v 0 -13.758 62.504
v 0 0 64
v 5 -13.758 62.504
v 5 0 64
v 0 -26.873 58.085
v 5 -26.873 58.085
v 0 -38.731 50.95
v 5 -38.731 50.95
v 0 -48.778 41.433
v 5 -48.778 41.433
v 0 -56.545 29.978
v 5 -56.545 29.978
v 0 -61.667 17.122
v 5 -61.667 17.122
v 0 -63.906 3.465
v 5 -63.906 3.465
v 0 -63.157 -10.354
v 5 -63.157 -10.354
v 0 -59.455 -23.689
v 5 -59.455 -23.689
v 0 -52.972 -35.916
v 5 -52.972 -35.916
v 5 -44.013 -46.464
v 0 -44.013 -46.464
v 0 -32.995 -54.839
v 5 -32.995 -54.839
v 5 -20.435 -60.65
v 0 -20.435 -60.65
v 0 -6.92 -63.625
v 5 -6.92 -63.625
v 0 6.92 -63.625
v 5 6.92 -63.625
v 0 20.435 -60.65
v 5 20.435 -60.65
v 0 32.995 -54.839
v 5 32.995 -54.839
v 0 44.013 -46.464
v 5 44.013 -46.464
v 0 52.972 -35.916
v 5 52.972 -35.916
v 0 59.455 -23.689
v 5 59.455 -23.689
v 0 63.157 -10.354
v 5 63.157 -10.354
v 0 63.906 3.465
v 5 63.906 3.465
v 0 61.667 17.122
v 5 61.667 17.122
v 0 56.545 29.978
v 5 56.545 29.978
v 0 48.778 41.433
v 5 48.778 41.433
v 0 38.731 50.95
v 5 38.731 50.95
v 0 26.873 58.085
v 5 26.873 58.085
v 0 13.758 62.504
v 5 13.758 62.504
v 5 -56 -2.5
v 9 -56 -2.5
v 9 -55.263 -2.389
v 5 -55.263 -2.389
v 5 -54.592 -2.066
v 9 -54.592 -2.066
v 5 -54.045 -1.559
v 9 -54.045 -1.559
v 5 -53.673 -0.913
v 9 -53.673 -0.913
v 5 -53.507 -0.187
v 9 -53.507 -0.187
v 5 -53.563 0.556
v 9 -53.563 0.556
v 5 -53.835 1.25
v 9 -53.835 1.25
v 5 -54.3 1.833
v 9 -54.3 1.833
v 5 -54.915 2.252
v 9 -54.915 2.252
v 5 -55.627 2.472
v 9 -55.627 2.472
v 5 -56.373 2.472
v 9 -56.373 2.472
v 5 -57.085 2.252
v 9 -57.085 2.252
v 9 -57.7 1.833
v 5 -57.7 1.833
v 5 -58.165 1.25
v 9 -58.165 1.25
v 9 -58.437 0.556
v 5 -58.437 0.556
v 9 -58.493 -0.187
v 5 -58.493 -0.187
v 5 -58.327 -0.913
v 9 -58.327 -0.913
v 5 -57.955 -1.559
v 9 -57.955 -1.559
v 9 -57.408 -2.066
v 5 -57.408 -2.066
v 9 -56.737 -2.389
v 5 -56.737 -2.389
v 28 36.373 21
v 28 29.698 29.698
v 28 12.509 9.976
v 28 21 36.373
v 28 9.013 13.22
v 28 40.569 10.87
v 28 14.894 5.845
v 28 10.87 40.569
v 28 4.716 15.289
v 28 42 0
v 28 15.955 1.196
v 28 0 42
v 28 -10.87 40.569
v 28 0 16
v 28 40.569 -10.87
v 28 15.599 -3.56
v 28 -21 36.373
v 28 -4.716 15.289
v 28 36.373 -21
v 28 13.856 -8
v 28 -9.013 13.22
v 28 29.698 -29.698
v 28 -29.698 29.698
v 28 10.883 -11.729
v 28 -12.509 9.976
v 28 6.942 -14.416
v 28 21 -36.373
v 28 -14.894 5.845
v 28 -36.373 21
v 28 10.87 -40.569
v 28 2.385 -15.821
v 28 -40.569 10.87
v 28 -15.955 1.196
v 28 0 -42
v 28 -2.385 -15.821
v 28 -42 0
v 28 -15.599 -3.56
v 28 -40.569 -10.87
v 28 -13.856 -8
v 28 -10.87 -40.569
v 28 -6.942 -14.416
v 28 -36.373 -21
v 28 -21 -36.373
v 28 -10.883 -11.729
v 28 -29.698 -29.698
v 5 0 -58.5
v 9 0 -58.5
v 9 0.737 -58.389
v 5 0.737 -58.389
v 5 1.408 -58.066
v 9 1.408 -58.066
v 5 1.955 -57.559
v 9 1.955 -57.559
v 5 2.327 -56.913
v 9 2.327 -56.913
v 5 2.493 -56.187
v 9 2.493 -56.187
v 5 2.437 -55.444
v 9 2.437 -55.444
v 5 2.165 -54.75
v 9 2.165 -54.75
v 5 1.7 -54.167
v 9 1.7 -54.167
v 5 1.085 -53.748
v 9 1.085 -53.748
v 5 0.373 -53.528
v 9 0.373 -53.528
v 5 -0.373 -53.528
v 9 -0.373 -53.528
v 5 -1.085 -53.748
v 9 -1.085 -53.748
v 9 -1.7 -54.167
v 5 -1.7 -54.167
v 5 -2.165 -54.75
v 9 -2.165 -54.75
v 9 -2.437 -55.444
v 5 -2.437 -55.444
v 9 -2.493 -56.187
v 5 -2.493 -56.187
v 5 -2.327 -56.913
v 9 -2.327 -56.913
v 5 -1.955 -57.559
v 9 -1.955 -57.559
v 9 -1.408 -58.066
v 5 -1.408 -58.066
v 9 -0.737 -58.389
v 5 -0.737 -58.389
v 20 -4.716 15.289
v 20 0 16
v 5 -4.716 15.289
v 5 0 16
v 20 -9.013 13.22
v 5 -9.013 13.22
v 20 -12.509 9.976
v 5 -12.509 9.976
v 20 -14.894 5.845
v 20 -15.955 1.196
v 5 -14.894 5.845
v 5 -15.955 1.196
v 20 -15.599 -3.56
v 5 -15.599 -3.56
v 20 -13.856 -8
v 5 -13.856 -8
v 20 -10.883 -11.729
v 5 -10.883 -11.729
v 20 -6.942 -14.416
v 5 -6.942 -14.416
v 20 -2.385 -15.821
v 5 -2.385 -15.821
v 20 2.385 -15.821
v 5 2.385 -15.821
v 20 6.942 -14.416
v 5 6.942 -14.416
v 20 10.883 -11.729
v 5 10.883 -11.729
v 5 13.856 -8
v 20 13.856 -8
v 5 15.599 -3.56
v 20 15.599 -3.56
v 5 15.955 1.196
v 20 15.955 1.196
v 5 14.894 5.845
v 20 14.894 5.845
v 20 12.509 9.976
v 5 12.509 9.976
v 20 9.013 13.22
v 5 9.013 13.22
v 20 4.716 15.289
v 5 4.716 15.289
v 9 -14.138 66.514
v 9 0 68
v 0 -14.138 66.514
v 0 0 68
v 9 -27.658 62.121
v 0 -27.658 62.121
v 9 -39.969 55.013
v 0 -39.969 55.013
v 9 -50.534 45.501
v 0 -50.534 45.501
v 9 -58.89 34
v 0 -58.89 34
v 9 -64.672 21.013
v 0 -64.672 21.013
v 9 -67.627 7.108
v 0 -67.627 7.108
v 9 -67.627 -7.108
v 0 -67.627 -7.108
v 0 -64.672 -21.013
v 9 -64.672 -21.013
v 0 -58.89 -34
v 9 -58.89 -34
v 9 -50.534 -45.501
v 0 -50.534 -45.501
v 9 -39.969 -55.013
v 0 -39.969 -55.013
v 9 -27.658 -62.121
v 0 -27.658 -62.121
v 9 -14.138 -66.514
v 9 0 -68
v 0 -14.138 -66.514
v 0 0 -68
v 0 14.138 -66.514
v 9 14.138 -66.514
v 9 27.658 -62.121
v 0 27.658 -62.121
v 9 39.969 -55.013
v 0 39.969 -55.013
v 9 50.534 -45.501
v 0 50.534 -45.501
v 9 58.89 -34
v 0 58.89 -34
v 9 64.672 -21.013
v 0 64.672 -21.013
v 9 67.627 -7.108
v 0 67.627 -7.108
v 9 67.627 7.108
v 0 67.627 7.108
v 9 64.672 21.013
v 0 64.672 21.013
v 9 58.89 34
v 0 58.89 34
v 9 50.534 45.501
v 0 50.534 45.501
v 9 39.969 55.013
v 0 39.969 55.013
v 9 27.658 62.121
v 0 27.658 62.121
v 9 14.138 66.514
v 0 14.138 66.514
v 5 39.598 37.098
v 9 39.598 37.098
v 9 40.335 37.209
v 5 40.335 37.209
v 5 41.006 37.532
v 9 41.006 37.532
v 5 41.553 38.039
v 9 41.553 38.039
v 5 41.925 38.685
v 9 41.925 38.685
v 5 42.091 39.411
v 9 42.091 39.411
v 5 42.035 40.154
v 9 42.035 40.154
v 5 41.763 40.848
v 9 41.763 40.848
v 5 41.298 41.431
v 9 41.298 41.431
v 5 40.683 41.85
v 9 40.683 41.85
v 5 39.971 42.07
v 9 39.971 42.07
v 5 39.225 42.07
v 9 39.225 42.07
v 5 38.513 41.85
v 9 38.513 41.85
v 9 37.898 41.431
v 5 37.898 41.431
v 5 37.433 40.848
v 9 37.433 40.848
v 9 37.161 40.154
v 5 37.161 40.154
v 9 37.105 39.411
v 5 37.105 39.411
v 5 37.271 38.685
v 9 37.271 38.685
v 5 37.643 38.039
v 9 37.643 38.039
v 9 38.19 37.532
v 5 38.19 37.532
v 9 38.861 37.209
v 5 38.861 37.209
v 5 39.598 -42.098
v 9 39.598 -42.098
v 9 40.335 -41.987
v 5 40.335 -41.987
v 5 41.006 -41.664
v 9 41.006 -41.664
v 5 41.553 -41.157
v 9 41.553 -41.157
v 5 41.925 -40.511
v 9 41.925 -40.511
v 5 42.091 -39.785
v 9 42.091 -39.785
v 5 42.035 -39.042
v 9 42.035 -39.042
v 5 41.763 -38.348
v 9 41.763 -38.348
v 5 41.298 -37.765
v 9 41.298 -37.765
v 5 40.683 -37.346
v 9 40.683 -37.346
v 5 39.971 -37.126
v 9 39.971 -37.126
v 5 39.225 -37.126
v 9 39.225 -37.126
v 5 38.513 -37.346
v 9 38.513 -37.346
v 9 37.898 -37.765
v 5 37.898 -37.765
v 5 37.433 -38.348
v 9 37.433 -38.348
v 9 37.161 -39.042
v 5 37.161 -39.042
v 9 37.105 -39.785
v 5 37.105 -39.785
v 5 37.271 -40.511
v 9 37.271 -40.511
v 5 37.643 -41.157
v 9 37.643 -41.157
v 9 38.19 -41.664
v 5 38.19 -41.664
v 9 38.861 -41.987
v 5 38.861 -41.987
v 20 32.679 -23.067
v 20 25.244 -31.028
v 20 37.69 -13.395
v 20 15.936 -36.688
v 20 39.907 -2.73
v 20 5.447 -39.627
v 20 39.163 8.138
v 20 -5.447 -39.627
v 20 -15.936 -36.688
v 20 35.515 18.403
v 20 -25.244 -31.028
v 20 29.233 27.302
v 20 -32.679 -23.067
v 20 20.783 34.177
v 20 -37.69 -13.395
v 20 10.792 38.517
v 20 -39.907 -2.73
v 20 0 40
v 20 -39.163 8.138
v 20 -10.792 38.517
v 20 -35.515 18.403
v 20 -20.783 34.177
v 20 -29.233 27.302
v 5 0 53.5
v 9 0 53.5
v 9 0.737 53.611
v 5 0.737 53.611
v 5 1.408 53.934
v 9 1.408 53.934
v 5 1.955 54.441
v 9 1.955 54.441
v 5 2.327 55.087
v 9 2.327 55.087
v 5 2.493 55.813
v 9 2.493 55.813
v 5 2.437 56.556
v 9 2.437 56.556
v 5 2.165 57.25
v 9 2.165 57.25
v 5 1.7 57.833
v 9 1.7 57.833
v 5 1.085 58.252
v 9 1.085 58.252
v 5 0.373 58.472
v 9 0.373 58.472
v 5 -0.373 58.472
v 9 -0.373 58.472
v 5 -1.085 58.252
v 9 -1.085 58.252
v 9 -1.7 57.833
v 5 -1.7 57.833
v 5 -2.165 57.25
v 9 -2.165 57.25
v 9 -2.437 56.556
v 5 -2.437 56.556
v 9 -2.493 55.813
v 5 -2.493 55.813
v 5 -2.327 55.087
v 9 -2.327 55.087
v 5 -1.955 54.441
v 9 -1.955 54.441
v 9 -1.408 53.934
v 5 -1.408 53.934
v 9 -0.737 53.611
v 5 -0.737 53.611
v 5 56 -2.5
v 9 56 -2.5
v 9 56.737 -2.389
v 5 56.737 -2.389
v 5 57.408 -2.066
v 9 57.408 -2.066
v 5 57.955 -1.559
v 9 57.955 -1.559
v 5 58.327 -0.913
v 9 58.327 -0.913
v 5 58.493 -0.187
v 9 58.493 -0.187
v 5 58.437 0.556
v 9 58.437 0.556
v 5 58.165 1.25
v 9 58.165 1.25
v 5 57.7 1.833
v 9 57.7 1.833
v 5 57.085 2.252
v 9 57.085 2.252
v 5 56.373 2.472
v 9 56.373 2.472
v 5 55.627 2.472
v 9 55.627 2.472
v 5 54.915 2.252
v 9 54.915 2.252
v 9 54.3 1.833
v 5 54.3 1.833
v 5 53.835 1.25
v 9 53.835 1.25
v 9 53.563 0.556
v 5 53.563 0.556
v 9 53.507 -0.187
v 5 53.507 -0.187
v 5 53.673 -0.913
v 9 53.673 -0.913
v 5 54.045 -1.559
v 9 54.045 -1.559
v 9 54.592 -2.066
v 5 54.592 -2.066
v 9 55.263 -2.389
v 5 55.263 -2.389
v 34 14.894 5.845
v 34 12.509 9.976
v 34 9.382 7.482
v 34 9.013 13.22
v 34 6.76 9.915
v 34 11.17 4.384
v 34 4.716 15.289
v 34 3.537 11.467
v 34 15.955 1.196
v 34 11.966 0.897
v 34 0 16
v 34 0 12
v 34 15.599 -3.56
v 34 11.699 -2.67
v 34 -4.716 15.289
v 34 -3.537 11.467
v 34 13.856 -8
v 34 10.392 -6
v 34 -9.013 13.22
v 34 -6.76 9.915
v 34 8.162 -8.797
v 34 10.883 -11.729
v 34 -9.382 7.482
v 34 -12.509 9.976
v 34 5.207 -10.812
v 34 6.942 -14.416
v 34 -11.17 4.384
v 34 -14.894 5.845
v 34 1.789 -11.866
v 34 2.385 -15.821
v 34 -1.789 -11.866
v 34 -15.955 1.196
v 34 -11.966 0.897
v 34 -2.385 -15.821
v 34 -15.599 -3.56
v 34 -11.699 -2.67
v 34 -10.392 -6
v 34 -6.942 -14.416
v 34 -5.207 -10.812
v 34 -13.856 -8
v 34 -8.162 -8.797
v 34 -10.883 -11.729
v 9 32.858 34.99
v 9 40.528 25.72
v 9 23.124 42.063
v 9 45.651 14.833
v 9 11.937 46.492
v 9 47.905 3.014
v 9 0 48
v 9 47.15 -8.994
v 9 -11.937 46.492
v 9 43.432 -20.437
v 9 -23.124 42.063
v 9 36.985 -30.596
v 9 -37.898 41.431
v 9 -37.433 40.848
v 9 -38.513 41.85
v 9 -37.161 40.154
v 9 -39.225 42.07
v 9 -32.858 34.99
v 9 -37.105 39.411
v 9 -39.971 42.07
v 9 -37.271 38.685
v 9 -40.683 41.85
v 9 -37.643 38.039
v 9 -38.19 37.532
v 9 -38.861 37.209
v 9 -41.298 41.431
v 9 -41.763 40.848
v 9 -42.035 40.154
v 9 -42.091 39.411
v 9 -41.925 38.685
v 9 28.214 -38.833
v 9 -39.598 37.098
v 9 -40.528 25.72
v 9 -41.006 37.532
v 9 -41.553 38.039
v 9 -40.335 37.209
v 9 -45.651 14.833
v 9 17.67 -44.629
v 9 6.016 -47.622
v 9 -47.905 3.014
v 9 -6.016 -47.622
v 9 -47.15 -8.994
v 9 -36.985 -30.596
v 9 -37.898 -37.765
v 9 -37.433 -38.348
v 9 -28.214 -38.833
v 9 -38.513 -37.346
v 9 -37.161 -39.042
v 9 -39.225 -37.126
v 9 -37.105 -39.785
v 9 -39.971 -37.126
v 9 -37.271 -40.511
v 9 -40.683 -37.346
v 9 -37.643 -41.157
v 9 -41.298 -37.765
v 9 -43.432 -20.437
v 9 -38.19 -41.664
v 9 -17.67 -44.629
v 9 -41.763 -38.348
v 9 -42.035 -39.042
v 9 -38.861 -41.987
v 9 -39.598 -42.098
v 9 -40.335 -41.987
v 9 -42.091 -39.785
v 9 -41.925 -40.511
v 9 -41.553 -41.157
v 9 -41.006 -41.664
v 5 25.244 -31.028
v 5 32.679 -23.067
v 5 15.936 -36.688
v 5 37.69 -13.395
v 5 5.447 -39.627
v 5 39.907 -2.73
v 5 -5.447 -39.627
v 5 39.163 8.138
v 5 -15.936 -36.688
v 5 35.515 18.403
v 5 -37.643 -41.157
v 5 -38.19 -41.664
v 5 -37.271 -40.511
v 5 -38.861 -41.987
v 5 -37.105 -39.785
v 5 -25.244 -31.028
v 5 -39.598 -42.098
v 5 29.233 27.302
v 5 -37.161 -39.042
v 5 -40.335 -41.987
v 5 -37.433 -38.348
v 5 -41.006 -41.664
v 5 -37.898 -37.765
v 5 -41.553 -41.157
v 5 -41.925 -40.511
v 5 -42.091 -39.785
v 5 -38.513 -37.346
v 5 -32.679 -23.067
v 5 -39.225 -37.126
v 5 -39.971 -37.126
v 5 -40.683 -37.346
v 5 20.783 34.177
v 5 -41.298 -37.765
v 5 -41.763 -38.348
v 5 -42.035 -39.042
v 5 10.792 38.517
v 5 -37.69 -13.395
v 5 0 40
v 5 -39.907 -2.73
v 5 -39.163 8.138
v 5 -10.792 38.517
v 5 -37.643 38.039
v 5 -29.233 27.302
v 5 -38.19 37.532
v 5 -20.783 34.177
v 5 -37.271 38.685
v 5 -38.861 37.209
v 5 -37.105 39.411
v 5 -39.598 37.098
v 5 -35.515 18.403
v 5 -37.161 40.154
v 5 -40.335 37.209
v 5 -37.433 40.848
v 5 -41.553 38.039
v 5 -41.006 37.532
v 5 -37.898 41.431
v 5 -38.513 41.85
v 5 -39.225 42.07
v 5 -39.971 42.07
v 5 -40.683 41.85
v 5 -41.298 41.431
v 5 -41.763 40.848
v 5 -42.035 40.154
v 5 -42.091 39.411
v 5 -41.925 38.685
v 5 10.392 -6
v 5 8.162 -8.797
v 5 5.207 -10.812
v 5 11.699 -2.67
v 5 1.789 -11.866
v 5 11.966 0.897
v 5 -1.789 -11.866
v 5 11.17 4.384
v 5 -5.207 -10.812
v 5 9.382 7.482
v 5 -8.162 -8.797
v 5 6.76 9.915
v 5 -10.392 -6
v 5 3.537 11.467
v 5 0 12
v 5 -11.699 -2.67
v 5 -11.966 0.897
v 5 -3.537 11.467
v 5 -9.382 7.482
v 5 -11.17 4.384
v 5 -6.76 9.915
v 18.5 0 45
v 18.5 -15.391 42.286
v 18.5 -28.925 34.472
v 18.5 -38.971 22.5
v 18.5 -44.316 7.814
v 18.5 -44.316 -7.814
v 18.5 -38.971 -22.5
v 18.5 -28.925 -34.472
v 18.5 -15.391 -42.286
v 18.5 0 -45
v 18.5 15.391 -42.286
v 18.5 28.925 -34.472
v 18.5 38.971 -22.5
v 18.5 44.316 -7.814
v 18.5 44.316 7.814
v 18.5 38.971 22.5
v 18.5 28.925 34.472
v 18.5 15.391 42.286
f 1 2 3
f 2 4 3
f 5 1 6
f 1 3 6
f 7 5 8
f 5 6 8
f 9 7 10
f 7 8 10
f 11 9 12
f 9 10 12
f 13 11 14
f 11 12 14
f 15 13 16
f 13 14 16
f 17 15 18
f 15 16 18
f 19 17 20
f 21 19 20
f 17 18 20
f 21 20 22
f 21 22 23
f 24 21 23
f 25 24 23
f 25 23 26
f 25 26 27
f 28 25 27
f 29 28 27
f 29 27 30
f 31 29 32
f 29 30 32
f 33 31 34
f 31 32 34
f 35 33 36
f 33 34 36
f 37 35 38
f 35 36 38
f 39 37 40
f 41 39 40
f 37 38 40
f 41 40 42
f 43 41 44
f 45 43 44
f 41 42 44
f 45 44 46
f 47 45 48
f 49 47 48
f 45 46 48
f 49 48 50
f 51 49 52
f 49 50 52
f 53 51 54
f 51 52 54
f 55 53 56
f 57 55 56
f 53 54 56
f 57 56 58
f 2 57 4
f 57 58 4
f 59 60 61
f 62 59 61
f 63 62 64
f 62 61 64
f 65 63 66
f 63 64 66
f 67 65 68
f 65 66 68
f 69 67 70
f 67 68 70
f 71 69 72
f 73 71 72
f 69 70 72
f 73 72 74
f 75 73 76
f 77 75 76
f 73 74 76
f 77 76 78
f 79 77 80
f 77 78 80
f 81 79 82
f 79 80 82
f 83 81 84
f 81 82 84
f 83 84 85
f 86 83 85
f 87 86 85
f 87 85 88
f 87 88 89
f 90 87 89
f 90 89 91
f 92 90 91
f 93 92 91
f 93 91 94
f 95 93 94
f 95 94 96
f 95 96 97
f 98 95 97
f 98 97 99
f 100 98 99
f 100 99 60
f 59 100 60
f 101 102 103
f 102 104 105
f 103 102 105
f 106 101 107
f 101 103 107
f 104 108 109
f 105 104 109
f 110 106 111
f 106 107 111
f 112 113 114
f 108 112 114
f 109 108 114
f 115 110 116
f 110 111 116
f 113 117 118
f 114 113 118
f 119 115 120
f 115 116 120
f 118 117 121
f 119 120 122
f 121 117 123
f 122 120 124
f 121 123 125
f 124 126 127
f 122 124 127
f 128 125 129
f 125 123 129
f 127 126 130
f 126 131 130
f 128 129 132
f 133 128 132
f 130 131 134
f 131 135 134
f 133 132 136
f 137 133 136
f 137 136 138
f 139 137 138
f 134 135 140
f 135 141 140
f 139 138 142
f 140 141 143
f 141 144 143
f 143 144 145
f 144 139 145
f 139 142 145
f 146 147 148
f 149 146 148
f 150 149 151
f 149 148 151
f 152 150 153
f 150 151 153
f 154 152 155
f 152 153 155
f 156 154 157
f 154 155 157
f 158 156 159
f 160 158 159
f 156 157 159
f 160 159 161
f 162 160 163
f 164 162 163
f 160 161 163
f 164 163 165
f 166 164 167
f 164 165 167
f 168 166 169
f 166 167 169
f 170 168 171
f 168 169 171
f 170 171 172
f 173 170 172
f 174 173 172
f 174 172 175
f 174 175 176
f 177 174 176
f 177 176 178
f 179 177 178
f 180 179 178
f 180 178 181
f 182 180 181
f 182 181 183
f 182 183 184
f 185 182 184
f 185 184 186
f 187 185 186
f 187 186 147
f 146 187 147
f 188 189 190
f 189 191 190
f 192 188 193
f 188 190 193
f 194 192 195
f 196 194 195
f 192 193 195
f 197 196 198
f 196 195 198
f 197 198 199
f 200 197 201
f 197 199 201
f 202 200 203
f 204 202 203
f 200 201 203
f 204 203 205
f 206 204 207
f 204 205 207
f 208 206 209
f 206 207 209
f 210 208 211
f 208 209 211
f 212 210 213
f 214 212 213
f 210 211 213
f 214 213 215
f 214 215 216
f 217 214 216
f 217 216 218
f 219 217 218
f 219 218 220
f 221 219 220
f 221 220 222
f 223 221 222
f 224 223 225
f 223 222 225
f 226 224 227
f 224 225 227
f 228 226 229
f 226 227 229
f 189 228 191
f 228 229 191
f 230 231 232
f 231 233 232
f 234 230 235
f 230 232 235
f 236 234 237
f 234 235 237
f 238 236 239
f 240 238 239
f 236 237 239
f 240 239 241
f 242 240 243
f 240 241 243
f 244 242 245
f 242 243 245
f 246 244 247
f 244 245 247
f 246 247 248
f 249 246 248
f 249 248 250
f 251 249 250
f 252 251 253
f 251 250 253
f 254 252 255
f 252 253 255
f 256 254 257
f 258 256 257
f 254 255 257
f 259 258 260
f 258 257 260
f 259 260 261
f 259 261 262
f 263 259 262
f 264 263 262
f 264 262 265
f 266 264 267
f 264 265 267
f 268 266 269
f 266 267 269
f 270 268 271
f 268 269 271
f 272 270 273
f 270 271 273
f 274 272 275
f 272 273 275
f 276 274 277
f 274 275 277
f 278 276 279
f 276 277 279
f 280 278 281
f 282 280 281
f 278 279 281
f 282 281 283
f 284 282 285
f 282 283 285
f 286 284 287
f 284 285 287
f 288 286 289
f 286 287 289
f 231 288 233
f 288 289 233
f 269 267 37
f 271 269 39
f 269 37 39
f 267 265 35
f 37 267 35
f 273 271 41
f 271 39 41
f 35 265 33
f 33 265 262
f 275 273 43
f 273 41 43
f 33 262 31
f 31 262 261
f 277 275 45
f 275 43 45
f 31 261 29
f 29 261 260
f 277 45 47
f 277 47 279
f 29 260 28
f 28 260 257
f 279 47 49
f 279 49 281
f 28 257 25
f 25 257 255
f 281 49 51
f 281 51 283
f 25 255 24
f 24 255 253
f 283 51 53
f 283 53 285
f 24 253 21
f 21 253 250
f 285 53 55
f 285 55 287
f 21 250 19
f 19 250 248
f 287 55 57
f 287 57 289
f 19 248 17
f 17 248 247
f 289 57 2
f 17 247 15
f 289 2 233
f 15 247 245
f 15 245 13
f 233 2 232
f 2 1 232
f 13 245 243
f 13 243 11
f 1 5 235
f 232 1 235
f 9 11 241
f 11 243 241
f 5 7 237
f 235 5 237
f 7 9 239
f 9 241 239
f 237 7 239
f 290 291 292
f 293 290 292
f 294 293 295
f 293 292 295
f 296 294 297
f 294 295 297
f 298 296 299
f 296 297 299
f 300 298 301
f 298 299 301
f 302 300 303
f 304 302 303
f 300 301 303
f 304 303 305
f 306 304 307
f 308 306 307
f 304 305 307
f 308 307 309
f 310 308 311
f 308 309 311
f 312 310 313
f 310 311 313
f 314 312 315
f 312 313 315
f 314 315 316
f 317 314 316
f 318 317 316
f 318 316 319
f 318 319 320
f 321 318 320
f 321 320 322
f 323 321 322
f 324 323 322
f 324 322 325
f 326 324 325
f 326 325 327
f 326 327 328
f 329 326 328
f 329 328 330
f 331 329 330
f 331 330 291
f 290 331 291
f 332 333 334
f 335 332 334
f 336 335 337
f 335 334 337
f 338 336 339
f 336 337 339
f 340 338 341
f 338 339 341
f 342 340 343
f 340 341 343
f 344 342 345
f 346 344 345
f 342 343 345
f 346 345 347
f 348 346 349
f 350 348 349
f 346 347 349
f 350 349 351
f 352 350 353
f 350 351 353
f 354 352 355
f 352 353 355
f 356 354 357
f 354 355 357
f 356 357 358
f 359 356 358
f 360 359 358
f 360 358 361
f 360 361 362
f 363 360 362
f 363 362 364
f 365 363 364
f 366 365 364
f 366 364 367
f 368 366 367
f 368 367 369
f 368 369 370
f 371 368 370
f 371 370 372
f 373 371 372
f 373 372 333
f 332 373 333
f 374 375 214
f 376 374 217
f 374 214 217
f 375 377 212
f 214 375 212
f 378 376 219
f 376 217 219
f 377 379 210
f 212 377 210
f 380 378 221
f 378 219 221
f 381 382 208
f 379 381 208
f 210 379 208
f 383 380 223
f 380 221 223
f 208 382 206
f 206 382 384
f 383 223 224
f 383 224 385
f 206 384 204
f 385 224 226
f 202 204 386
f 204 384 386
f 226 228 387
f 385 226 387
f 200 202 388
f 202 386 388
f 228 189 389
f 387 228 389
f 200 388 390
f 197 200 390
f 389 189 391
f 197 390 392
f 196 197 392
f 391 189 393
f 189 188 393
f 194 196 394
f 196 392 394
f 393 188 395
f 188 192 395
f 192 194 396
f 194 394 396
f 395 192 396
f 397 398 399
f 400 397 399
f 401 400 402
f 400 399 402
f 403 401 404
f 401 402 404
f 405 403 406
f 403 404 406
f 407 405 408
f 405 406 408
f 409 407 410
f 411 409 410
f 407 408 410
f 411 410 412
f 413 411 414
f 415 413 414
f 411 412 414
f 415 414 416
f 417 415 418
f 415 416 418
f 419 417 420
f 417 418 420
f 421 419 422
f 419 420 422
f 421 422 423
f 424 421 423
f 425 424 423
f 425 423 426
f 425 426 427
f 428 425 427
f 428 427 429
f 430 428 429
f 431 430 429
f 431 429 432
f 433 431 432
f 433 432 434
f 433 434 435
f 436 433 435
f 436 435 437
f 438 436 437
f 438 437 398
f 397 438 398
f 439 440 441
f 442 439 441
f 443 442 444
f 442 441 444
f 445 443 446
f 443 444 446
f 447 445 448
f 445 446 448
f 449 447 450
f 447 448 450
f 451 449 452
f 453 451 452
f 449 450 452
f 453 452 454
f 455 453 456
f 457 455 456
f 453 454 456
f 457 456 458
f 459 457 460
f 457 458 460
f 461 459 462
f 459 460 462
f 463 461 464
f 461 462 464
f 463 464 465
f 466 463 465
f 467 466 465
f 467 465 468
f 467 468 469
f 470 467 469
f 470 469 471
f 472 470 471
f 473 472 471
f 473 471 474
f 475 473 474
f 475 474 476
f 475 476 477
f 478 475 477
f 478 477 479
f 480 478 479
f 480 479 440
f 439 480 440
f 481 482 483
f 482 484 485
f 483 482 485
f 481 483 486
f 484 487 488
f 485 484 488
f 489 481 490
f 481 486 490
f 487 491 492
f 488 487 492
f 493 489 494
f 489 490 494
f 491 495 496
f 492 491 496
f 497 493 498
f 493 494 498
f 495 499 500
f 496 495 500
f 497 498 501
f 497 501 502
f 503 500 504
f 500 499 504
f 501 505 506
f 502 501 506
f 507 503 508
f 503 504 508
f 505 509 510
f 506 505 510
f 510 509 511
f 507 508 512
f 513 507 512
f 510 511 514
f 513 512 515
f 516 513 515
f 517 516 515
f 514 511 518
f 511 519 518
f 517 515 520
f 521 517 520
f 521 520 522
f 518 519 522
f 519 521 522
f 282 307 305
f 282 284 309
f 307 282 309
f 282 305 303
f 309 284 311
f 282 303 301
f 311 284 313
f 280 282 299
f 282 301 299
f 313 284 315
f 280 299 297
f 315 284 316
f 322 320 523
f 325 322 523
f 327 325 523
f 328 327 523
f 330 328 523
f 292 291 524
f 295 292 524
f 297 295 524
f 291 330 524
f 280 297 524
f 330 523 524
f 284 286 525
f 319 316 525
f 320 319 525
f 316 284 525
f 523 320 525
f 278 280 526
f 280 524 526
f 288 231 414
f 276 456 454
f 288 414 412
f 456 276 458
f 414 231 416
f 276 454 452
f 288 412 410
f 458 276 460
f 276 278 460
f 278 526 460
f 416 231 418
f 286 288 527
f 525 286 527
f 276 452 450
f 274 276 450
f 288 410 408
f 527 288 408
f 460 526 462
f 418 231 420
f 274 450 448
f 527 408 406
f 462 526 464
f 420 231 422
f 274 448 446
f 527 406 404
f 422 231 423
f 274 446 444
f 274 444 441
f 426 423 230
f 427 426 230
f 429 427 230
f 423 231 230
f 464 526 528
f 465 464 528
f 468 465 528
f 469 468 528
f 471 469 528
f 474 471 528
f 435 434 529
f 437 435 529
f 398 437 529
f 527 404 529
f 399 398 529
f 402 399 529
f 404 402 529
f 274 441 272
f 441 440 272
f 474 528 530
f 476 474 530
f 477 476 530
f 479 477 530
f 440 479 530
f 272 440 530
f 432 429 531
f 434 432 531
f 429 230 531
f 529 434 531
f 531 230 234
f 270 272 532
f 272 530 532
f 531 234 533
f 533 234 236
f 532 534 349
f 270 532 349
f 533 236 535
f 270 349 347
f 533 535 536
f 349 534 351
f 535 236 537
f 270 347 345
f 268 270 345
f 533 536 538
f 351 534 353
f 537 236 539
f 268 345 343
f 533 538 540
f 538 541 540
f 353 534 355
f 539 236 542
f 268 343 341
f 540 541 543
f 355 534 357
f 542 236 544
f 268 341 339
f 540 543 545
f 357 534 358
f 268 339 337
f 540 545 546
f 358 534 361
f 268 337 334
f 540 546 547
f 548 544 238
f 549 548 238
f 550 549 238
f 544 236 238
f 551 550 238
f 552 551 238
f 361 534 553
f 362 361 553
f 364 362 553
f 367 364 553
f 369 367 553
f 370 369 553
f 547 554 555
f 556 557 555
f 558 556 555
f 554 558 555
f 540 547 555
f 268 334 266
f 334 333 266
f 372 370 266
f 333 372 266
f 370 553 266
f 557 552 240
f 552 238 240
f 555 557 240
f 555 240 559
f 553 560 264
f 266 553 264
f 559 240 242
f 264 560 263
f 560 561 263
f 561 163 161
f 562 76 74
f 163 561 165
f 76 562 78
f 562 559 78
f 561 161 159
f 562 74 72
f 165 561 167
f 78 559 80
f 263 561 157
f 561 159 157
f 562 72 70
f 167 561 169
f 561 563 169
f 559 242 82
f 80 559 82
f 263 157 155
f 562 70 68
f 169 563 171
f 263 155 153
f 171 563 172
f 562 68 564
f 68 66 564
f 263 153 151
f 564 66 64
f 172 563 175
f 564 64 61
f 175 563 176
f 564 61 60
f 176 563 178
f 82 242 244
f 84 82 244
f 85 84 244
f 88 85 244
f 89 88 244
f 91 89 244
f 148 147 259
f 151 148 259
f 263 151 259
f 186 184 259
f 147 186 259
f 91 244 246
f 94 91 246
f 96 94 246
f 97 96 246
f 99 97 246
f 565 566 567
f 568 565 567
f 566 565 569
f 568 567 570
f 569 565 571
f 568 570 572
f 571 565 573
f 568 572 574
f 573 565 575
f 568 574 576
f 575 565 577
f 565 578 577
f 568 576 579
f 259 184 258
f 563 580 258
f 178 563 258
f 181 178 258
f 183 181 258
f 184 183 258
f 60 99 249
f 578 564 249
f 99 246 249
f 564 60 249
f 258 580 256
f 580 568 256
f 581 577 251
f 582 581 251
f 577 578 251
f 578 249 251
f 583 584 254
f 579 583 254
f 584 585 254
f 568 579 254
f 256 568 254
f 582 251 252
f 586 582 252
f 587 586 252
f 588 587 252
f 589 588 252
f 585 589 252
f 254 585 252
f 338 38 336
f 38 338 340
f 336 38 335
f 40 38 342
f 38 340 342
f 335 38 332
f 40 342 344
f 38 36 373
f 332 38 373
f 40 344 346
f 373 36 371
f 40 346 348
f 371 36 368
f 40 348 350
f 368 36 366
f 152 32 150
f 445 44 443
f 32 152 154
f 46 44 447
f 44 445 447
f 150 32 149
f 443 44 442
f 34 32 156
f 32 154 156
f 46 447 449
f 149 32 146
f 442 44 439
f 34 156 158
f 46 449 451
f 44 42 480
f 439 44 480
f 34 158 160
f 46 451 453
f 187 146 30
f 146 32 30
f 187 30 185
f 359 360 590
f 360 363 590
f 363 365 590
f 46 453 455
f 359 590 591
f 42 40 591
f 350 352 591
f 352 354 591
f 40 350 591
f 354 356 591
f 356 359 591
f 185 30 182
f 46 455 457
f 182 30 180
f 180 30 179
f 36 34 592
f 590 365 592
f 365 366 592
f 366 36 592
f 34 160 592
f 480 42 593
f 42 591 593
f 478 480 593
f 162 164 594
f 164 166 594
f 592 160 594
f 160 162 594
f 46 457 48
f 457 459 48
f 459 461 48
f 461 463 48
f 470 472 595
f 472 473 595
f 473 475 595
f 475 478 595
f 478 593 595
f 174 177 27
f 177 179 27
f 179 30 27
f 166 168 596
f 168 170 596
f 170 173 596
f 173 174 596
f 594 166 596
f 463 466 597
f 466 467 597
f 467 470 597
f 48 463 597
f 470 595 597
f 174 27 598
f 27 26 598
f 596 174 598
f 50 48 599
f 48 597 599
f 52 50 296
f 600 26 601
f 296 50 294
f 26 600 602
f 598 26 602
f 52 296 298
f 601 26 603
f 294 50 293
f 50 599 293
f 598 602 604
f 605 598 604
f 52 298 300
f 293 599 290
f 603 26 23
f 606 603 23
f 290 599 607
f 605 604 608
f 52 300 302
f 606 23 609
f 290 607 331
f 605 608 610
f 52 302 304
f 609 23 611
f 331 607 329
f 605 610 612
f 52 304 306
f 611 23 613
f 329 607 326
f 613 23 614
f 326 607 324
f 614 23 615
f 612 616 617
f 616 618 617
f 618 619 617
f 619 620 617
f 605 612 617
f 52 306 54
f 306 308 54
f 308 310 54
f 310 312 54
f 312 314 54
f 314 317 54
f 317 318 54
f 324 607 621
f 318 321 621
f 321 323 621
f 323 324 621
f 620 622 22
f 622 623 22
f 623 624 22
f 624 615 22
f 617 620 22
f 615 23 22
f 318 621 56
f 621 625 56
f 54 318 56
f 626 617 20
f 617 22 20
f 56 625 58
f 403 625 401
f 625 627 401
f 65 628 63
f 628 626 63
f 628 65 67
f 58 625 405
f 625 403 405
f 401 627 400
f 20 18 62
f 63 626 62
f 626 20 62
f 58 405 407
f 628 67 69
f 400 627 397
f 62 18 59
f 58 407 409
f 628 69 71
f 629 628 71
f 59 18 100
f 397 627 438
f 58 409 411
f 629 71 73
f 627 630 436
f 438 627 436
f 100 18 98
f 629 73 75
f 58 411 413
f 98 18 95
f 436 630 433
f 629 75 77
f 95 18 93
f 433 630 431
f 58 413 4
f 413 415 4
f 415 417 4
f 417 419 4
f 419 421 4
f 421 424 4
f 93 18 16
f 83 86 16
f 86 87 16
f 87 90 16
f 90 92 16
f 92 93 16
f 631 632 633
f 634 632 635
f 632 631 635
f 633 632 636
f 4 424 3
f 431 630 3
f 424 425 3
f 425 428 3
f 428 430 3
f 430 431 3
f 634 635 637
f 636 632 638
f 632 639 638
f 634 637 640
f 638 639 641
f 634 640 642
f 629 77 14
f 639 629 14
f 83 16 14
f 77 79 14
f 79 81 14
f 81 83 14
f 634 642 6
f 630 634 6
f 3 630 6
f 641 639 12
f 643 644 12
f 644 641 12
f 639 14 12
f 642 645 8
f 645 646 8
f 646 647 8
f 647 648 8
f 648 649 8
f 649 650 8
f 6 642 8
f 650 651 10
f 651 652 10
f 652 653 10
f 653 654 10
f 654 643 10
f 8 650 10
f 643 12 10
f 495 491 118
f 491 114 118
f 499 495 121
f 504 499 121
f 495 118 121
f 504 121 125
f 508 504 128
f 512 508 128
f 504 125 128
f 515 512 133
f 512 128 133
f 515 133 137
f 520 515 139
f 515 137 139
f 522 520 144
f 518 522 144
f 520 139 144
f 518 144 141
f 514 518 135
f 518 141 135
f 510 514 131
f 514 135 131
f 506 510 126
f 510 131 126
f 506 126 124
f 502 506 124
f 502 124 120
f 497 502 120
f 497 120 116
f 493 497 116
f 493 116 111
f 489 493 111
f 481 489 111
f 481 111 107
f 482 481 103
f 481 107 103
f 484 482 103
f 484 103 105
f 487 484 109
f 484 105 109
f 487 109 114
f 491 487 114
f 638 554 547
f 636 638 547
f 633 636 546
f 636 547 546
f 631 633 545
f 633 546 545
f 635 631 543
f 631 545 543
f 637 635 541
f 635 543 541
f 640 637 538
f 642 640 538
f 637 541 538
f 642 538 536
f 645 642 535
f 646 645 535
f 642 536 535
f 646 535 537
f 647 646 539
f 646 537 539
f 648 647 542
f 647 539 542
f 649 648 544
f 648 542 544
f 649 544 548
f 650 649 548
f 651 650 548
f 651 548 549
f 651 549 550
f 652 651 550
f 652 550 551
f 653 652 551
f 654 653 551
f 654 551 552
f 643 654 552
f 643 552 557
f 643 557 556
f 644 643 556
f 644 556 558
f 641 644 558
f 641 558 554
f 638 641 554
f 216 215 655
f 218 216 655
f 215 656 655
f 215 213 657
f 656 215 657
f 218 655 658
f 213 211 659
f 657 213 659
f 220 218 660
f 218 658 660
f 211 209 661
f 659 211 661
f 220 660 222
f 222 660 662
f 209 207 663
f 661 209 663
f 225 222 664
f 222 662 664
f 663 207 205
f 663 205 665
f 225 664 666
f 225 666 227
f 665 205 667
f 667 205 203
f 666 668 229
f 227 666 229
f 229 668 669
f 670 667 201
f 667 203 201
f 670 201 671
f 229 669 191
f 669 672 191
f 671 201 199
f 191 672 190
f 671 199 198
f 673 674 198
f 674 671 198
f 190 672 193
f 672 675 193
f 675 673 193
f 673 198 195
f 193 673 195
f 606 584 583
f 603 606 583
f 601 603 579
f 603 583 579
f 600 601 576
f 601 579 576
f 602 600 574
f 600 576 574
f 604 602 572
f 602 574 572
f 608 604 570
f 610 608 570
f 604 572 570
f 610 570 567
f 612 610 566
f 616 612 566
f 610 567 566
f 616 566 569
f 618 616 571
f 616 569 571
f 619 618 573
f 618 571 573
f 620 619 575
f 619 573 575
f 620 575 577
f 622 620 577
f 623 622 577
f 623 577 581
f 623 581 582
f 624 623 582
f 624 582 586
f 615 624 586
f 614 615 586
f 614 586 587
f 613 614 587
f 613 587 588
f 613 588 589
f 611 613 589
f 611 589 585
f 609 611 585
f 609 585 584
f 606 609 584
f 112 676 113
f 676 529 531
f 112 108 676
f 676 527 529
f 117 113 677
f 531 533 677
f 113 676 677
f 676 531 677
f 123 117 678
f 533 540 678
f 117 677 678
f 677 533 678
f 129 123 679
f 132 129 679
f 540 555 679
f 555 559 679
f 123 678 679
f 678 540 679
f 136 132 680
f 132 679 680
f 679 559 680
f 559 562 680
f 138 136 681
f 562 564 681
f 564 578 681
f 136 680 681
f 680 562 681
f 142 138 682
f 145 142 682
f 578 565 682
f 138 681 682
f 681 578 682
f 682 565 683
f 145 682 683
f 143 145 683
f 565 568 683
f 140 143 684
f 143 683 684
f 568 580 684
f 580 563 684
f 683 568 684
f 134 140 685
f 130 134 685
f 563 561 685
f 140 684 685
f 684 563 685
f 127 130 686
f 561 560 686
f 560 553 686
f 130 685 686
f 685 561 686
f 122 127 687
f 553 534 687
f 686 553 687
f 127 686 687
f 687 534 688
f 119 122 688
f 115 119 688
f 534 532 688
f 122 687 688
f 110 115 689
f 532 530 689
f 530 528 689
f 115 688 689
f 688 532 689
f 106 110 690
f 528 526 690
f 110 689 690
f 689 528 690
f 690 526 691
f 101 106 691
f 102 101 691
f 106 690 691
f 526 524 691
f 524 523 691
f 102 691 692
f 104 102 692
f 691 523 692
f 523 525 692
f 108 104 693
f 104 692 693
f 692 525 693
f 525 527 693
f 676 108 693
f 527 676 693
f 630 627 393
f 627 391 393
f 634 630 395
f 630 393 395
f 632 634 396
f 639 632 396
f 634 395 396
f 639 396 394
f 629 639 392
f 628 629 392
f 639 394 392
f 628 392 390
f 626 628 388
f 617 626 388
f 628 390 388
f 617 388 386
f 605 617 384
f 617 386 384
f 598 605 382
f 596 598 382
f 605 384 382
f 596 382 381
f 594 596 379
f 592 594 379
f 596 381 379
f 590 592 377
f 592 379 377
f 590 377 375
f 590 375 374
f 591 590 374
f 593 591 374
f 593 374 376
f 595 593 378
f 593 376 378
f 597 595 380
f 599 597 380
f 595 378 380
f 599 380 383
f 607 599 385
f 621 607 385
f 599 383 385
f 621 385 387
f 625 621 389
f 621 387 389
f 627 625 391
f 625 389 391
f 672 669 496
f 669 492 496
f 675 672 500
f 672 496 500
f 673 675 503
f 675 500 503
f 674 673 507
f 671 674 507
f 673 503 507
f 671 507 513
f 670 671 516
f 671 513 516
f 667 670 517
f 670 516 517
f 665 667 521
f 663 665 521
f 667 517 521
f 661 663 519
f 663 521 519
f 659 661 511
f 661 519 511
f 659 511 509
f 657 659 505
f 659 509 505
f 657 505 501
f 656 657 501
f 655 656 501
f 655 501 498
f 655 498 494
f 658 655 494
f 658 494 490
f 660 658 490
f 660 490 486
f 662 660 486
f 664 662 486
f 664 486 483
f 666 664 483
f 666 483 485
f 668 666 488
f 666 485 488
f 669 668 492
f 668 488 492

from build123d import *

# Parameters (mm, degrees)
SKETCH2_R          = 2.5
CUT_EXTRUDE1_DEPTH = 100.36297097


with BuildPart() as part:
    # Sketch1 → Revolve1 (revolve)
    with BuildSketch(Plane.XY, mode=Mode.PRIVATE) as revolve1_sk:
        Polygon((5, 12), (34, 12), (34, 16), (28, 16), (28, 42), (9, 48), (9, 68), (0, 68), (0, 64), (5, 64), (5, 40), (20, 40), (20, 16), (5, 16), align=None)
    revolve(revolve1_sk.sketch.rotate(Axis((0, 0, 0), (1, 0, 0)), 90), axis=Axis((0, 0, 0), (1, 0, 0)))

    # Sketch2 → Cut-Extrude1 (cut, through all)
    with BuildSketch(Plane(origin=(9, 0, 0), x_dir=(0, 0, -1), z_dir=(1, 0, 0))):
        with Locations((0, 56)):
            Circle(SKETCH2_R)
        with Locations((39.597979746, 39.597979746)):
            Circle(SKETCH2_R)
        with Locations((56, 0)):
            Circle(SKETCH2_R)
        with Locations((39.597979746, -39.597979746)):
            Circle(SKETCH2_R)
        with Locations((0, -56)):
            Circle(SKETCH2_R)
        with Locations((-39.597979746, -39.597979746)):
            Circle(SKETCH2_R)
        with Locations((-56, 0)):
            Circle(SKETCH2_R)
        with Locations((-39.597979746, 39.597979746)):
            Circle(SKETCH2_R)
    extrude(amount=-CUT_EXTRUDE1_DEPTH, mode=Mode.SUBTRACT)


solid = part.part
